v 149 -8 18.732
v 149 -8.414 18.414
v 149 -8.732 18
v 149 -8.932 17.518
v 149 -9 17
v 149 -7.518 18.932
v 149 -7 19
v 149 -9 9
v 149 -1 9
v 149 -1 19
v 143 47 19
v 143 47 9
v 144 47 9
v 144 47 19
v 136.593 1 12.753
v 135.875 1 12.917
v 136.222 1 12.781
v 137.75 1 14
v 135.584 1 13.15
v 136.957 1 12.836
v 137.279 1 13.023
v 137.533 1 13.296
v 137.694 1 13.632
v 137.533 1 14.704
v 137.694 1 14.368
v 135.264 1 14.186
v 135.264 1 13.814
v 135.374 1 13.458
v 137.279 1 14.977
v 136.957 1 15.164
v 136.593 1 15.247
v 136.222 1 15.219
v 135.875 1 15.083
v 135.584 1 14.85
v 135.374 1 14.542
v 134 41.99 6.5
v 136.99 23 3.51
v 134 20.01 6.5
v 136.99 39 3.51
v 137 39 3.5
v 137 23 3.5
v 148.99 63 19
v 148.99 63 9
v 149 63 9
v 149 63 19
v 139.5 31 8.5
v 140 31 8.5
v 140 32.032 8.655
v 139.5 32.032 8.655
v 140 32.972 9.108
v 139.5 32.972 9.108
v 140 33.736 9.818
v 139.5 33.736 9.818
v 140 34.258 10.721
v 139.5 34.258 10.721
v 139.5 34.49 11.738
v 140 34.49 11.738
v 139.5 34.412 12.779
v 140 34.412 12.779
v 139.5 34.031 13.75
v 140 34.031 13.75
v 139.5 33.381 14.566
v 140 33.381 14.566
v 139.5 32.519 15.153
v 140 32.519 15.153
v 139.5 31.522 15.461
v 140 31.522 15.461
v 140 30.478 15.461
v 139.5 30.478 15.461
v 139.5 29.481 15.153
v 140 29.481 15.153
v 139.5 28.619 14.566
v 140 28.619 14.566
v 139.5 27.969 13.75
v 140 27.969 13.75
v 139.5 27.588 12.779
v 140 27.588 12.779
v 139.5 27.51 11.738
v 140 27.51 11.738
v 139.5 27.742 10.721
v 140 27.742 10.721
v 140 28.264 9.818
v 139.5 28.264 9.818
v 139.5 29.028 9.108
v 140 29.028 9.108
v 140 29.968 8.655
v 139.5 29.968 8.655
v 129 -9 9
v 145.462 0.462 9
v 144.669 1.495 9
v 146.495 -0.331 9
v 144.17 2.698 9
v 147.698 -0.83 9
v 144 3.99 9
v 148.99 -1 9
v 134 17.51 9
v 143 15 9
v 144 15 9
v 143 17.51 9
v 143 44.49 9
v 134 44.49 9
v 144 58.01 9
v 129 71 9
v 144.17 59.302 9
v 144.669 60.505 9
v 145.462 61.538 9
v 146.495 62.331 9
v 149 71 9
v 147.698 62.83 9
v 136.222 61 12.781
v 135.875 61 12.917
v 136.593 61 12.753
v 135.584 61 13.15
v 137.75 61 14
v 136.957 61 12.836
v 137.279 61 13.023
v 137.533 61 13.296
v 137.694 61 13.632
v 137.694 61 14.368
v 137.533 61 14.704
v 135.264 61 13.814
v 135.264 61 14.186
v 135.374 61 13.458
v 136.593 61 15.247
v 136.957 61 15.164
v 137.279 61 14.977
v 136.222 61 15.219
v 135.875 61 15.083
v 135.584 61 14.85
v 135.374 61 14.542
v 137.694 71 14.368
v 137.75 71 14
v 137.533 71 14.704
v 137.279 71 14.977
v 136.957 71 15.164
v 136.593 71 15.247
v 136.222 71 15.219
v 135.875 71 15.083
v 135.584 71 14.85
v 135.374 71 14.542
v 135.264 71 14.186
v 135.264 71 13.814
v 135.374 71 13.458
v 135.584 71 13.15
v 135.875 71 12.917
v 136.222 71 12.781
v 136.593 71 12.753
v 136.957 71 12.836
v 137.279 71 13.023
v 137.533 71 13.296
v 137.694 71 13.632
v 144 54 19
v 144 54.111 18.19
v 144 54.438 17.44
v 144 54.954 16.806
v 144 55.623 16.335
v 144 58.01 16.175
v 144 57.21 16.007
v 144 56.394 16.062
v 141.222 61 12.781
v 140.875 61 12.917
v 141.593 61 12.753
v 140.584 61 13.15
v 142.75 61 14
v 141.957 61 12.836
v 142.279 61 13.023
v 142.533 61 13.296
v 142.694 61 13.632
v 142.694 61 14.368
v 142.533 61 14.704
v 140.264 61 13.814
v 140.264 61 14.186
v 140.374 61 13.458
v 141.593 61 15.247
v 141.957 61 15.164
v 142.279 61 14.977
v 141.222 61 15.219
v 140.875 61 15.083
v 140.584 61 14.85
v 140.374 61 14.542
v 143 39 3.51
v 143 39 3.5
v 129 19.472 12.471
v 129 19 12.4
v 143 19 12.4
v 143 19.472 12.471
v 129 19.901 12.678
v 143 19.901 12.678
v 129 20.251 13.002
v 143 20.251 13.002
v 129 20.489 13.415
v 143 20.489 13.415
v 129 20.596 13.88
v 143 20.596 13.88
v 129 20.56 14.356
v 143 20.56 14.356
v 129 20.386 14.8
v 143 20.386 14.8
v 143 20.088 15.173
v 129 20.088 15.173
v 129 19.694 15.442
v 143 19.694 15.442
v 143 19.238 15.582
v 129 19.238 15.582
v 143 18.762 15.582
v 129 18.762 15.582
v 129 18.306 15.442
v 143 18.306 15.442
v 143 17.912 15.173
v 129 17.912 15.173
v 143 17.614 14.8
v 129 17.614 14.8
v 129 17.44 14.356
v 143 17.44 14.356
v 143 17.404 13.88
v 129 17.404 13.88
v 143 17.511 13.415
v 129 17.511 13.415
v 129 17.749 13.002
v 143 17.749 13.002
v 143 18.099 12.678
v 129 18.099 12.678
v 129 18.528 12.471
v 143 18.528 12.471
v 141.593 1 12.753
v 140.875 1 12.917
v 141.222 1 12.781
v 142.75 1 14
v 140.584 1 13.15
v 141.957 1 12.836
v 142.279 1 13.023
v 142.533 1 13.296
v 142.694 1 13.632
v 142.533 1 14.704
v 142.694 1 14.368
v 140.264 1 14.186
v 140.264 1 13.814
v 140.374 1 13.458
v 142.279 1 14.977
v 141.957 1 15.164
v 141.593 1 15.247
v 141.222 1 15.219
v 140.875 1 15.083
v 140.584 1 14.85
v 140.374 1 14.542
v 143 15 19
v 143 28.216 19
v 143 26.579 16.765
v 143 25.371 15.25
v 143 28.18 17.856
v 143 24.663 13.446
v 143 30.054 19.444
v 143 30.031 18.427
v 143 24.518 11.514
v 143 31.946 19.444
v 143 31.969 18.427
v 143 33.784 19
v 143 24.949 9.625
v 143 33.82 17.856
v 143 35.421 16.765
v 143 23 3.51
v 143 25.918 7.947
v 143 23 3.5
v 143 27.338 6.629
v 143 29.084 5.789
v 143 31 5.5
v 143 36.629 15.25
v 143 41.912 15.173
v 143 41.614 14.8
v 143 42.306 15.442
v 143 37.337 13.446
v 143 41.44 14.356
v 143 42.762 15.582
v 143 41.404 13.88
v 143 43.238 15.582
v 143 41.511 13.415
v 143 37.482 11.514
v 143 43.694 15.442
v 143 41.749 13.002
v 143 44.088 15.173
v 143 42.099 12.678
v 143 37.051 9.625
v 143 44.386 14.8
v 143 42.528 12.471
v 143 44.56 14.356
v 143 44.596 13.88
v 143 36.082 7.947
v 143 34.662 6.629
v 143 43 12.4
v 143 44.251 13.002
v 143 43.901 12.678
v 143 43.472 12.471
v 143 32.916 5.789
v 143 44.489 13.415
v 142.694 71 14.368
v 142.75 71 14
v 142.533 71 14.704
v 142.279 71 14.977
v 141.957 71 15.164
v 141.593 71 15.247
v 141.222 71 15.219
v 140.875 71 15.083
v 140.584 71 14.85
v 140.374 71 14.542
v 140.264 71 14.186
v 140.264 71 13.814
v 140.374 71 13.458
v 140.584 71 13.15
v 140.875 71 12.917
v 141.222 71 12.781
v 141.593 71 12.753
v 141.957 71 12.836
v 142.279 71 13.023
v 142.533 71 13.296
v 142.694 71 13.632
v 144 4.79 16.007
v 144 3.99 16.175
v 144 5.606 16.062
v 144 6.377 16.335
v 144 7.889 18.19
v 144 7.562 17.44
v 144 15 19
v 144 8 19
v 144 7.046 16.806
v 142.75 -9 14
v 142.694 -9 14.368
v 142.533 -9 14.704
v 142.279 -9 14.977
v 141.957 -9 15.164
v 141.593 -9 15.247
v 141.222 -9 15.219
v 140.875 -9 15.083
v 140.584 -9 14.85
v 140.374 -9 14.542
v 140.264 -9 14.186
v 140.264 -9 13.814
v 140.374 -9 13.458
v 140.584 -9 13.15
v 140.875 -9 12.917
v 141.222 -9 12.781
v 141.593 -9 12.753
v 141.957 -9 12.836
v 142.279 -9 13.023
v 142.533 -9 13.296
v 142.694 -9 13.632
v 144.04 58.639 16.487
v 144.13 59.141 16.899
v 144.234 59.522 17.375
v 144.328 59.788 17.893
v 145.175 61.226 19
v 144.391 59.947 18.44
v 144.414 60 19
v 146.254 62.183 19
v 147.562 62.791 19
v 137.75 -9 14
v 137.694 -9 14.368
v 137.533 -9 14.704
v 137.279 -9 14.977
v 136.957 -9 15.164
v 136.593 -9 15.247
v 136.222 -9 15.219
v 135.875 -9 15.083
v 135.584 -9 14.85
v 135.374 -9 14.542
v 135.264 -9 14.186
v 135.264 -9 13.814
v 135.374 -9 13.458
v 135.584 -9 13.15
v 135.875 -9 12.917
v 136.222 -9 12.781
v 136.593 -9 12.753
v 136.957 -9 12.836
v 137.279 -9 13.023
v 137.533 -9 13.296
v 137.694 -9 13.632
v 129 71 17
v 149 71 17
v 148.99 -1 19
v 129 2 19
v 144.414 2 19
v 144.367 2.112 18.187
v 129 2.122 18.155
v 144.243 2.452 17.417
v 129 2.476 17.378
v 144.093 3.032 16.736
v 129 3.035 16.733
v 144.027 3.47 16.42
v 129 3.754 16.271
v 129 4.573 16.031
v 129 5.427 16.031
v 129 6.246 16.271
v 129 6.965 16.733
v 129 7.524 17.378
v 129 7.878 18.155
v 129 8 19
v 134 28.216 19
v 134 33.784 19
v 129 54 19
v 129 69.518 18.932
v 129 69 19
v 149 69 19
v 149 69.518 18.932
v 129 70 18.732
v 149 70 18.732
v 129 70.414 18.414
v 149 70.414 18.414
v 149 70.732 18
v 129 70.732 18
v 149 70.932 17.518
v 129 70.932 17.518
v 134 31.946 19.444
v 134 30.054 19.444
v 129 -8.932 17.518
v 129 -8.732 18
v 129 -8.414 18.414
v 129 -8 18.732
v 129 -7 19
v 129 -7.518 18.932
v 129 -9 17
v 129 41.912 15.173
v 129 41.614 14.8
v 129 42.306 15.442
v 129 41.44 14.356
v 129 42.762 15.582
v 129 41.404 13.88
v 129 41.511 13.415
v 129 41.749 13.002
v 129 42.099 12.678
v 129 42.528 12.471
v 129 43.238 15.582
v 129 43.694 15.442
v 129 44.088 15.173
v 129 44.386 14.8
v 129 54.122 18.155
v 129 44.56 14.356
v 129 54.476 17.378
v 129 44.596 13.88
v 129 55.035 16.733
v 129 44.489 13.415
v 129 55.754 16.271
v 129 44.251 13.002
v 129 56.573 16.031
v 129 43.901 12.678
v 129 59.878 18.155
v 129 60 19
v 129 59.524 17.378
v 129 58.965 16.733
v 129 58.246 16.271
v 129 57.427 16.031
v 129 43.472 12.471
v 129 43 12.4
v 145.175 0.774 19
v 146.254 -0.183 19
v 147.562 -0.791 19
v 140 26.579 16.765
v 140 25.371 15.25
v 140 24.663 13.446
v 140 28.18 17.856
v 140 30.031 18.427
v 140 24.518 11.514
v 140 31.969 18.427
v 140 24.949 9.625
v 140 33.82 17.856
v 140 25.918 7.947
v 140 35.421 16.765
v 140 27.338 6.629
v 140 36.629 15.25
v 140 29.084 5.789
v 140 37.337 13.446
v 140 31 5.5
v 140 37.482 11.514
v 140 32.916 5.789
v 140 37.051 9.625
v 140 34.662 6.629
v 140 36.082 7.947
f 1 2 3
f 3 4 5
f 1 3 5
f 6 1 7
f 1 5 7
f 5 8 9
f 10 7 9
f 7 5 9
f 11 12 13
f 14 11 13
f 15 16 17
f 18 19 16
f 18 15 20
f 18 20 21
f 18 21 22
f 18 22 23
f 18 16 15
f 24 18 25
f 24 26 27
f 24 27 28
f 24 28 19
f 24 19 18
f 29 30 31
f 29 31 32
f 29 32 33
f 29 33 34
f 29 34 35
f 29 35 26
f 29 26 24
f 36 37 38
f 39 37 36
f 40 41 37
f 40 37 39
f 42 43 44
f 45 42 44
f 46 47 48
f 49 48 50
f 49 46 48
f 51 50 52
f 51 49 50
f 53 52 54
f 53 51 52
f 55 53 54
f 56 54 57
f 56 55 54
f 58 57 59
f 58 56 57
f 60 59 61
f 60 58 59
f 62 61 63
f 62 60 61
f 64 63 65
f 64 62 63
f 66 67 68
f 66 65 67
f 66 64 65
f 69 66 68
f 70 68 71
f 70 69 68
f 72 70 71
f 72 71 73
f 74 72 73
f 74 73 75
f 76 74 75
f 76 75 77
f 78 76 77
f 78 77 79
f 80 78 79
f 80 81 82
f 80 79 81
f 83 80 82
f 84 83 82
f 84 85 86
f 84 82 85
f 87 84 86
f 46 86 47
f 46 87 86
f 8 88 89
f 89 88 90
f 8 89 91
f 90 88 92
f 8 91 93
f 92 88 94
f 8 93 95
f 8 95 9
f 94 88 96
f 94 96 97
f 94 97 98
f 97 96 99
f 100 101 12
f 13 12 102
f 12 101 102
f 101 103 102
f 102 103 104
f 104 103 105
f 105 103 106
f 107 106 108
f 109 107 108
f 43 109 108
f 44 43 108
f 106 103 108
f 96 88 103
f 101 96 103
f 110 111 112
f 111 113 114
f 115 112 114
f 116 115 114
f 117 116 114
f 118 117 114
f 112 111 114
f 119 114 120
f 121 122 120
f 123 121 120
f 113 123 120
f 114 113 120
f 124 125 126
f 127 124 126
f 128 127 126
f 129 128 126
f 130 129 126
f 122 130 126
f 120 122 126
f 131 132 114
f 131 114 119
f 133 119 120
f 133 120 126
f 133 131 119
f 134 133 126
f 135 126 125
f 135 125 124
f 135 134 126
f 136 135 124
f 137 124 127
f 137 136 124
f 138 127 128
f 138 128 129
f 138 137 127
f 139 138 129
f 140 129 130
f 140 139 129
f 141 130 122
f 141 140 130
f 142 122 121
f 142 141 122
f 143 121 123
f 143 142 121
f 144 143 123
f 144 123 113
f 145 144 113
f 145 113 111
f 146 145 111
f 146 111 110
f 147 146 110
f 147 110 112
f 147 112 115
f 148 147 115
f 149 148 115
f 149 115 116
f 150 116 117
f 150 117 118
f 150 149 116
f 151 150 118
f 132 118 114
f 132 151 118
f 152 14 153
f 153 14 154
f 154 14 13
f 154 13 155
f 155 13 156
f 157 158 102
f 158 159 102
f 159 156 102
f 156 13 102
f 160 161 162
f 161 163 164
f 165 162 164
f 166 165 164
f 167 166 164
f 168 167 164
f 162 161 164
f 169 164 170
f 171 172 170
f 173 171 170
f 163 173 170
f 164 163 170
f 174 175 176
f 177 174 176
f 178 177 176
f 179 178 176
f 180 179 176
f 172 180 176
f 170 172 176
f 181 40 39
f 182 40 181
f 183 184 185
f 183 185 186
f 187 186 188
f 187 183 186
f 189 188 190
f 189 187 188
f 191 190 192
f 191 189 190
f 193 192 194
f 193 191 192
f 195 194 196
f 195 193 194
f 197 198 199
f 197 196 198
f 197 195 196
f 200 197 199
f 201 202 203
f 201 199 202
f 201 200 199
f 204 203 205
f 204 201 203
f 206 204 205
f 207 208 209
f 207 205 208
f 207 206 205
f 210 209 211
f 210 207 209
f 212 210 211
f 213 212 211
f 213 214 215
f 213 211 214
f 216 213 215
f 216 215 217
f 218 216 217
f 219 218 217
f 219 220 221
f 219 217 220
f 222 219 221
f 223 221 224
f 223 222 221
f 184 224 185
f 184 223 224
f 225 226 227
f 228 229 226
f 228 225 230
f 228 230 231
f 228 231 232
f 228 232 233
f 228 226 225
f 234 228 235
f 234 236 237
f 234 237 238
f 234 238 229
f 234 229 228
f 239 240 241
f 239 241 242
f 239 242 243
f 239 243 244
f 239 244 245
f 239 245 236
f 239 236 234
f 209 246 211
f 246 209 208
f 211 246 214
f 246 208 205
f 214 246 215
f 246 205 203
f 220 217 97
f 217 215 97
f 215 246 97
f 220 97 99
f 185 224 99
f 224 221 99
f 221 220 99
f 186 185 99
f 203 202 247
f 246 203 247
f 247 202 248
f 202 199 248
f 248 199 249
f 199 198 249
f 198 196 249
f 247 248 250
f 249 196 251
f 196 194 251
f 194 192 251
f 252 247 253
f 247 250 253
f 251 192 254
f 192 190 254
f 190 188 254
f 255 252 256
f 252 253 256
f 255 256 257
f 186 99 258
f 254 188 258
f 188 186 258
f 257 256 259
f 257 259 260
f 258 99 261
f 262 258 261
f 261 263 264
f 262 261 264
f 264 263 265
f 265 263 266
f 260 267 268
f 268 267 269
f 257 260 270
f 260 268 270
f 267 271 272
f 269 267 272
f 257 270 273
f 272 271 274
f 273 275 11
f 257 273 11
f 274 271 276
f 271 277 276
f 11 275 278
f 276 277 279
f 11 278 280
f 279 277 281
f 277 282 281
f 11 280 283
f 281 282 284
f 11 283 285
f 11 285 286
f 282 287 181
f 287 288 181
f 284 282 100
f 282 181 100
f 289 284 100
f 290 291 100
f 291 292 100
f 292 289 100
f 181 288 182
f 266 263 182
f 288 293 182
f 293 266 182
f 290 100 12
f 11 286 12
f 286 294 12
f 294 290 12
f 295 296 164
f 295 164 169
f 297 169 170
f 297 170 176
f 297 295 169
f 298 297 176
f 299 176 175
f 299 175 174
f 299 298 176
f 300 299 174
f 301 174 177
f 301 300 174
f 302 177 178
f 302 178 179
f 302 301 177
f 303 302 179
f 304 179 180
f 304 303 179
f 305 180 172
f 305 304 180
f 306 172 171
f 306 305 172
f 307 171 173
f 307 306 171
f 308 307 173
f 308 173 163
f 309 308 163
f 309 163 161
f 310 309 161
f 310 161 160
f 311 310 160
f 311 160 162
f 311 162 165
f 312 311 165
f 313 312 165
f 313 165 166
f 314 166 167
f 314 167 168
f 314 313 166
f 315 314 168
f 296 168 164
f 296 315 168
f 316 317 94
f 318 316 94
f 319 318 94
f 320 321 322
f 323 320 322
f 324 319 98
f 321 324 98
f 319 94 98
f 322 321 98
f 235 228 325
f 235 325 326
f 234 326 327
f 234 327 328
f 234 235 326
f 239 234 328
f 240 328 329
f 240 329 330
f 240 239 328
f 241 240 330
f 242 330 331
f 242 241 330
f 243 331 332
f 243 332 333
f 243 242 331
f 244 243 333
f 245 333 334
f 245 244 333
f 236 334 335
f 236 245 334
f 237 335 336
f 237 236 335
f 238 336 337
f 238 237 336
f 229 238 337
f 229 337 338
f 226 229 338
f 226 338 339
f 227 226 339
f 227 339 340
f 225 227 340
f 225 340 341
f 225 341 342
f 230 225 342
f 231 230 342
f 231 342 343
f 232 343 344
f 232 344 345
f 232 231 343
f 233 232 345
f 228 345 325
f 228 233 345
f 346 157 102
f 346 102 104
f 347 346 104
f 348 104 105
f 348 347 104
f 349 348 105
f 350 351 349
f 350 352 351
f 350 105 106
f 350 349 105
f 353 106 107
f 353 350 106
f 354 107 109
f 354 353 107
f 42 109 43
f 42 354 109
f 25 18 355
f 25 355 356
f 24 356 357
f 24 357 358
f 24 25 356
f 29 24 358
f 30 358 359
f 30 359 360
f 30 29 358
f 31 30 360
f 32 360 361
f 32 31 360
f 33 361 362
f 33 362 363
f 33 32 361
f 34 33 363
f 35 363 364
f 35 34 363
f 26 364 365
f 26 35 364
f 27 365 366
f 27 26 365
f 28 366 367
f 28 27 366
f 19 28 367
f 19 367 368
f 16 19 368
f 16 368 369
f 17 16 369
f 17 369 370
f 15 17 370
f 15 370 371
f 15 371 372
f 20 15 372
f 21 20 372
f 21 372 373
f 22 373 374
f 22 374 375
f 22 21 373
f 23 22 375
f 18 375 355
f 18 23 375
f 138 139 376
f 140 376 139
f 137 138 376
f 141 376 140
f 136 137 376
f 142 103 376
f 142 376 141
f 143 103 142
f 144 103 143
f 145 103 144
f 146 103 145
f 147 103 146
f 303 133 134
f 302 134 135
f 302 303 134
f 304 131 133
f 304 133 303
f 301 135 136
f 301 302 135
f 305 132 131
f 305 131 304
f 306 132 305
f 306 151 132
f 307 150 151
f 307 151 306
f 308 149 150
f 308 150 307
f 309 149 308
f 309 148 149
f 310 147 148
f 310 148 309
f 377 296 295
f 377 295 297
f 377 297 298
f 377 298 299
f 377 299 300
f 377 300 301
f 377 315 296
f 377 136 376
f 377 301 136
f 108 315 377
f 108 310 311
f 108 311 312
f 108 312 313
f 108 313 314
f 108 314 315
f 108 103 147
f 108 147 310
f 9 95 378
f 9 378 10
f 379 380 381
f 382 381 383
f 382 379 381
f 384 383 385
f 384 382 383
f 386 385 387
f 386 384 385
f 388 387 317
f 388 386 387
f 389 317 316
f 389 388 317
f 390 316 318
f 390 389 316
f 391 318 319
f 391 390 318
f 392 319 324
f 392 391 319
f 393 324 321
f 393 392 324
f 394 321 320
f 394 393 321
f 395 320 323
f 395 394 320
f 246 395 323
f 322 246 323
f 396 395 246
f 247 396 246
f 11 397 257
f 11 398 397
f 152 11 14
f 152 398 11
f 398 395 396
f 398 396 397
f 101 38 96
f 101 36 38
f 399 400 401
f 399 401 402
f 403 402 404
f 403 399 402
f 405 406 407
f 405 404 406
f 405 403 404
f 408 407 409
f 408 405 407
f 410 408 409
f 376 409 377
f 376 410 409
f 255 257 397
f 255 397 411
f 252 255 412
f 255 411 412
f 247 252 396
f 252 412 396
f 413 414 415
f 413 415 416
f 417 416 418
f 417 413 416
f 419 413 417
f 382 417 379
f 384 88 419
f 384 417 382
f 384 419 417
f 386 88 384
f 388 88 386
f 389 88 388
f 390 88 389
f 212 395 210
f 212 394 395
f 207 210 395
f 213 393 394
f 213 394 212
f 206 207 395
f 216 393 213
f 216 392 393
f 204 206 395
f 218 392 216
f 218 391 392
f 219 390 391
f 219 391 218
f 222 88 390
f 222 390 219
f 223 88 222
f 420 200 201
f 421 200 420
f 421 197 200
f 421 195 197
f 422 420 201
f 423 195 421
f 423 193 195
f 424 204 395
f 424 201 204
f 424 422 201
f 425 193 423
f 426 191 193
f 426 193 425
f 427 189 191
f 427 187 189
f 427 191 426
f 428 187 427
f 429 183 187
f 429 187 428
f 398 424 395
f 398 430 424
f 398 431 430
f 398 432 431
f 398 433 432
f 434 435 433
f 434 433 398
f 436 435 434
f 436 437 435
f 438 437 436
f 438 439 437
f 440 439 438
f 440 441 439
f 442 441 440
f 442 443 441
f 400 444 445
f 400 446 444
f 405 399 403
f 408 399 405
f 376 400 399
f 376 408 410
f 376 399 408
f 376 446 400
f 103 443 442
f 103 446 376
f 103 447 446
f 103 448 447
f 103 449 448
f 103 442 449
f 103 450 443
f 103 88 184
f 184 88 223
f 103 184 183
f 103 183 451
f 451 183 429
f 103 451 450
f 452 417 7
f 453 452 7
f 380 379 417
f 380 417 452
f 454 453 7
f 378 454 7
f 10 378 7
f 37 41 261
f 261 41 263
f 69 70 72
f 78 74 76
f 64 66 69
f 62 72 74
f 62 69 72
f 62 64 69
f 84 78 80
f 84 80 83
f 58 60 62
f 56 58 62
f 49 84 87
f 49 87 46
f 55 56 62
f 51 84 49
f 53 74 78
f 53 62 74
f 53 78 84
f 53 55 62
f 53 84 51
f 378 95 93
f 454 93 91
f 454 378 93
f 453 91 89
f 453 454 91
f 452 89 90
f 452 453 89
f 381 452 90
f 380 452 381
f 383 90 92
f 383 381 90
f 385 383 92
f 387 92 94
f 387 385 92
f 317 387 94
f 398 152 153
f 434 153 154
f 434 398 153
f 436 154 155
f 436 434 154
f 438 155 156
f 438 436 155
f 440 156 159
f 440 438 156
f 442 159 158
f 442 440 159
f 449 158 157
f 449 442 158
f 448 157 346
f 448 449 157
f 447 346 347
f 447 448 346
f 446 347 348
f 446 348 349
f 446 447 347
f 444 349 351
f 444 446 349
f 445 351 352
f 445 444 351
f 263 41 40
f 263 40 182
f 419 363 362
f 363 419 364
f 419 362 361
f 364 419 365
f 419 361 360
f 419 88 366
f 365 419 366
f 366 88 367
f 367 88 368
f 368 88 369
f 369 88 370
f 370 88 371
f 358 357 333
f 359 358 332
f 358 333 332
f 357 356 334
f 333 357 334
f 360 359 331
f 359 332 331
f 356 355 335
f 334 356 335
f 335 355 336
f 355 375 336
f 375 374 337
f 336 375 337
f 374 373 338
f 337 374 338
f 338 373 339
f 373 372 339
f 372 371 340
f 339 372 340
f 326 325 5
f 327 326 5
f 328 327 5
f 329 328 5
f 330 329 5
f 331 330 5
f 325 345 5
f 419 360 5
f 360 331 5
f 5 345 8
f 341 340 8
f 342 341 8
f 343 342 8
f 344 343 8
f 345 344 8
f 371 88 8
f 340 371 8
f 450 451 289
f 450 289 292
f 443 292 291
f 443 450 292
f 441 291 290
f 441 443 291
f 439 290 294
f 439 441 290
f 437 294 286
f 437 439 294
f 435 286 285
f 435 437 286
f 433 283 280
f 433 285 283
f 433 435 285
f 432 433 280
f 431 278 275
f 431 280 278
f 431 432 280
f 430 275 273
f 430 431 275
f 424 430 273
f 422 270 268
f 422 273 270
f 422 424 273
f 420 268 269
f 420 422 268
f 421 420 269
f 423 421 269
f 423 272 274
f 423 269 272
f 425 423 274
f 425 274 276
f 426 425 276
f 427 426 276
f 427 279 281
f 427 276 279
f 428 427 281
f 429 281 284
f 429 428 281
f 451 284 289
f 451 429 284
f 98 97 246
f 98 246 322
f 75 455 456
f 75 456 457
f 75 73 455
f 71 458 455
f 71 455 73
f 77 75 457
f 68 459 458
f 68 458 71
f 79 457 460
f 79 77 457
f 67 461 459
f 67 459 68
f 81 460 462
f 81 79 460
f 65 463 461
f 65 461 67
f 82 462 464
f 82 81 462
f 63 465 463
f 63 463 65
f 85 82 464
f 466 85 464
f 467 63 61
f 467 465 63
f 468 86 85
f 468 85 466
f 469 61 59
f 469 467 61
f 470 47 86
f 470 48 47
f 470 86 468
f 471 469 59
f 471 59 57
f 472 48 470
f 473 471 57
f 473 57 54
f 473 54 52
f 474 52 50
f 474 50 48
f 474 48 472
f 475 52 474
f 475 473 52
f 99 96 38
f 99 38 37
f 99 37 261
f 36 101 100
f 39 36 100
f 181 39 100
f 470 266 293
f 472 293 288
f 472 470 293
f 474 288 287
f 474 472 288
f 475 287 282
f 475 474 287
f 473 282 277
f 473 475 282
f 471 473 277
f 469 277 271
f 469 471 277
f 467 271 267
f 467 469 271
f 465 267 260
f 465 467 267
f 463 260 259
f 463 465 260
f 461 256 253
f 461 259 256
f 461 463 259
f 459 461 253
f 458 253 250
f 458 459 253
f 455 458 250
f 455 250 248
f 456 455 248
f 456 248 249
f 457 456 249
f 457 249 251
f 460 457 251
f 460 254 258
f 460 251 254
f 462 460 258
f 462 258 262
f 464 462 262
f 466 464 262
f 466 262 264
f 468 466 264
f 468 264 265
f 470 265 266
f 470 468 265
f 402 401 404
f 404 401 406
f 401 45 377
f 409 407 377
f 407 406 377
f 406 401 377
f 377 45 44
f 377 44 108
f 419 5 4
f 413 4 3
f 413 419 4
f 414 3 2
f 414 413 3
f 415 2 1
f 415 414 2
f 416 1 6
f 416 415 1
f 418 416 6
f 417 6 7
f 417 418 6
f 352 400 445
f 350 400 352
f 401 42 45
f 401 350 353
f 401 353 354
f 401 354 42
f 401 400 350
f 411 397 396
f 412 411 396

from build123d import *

# Parameters (mm, degrees)
CYLINDER357_R     = 3
CYLINDER357_DEPTH = 17
CYLINDER356_R     = 3
CYLINDER356_DEPTH = 17
BOX221_W          = 5
BOX221_H          = 8
BOX221_DEPTH      = 10
FILLET089_R       = 2
BOX222_W          = 5
BOX222_H          = 60
BOX222_DEPTH      = 10
BOX217_W          = 1
BOX217_H          = 32
BOX217_DEPTH      = 22
CYLINDER297_R     = 1.6
CYLINDER297_DEPTH = 16
CYLINDER296_R     = 1.6
CYLINDER296_DEPTH = 16
CYLINDER295_R     = 1.25
CYLINDER295_DEPTH = 10
CYLINDER293_R     = 1.25
CYLINDER293_DEPTH = 10
CYLINDER294_R     = 1.25
CYLINDER294_DEPTH = 10
CYLINDER292_R     = 1.25
CYLINDER292_DEPTH = 10
CYLINDER291_R     = 3.5
CYLINDER291_DEPTH = 4
CYLINDER289_R     = 6.5
CYLINDER289_DEPTH = 4
BOX218_W          = 15
BOX218_H          = 16
BOX218_DEPTH      = 5.5
CYLINDER290_R     = 8
CYLINDER290_DEPTH = 10
BOX216_W          = 10
BOX216_H          = 80
BOX216_DEPTH      = 10
BOX219_W          = 5
BOX219_H          = 80
BOX219_DEPTH      = 10
FILLET090_R       = 2
BOX220_W          = 5
BOX220_H          = 8
BOX220_DEPTH      = 10
FILLET088_R       = 2
CHAMFER031_SIZE   = 5.49
CHAMFER032_SIZE   = 3
FILLET110_R       = 4.99


with BuildPart() as cylinder357:
    # Cylinder357 → Cylinder357 (new body)
    with BuildSketch(Plane(origin=(129, 57, 19), x_dir=(0, 0, -1), z_dir=(1, 0, 0))):
        Circle(CYLINDER357_R)
    extrude(amount=CYLINDER357_DEPTH)


with BuildPart() as fusion302:
    # Cylinder356 → Cylinder356 (new body)
    with BuildSketch(Plane(origin=(129, 5, 19), x_dir=(0, 0, -1), z_dir=(1, 0, 0))):
        Circle(CYLINDER356_R)
    extrude(amount=CYLINDER356_DEPTH)

    # Fusion302: union Cylinder357
    add(cylinder357.part)


with BuildPart() as fillet089:
    # Box221 → Box221 (new body)
    with BuildSketch(Plane(origin=(90, 53, 9), x_dir=(1, 0, 0), z_dir=(0, 0, 1))):
        with Locations((2.5, 4)):
            Rectangle(BOX221_W, BOX221_H)
    extrude(amount=BOX221_DEPTH)

    # Fillet089
    fillet089_edges = [fillet089.edges().sort_by_distance(p)[0] for p in [
        (92.5, 61, 19),
    ]]
    fillet(fillet089_edges, radius=FILLET089_R)


with BuildPart() as fillet089_1:
    # Fillet089 placement: moved
    add(fillet089.part.moved(Location((0, 10, 0))))


with BuildPart() as cube302:
    # Box222 → Box222 (new body)
    with BuildSketch(Plane(origin=(75, 1, -1), x_dir=(1, 0, 0), z_dir=(0, 0, 1))):
        with Locations((2.5, 30)):
            Rectangle(BOX222_W, BOX222_H)
    extrude(amount=BOX222_DEPTH)


with BuildPart() as cube297:
    # Box217 → Box217 (new body)
    with BuildSketch(Plane(origin=(89, 15, 2), x_dir=(1, 0, 0), z_dir=(0, 0, 1))):
        with Locations((0.5, 16)):
            Rectangle(BOX217_W, BOX217_H)
    extrude(amount=BOX217_DEPTH)


with BuildPart() as cylinder297:
    # Cylinder297 → Cylinder297 (new body)
    with BuildSketch(Plane(origin=(80, 43, 14), x_dir=(0, 0, -1), z_dir=(1, 0, 0))):
        Circle(CYLINDER297_R)
    extrude(amount=CYLINDER297_DEPTH)


with BuildPart() as fusion262:
    # Cylinder296 → Cylinder296 (new body)
    with BuildSketch(Plane(origin=(80, 19, 14), x_dir=(0, 0, -1), z_dir=(1, 0, 0))):
        Circle(CYLINDER296_R)
    extrude(amount=CYLINDER296_DEPTH)

    # Fusion262: union Cylinder297
    add(cylinder297.part)


with BuildPart() as fusion262_1:
    # Fusion262 placement: moved
    add(fusion262.part.moved(Location((-6, 0, 0))))


with BuildPart() as cylinder295:
    # Cylinder295 → Cylinder295 (new body)
    with BuildSketch(Plane(origin=(87.5, 71, 14), x_dir=(1, 0, 0), z_dir=(0, -1, 0))):
        Circle(CYLINDER295_R)
    extrude(amount=CYLINDER295_DEPTH)


with BuildPart() as fusion260:
    # Cylinder293 → Cylinder293 (new body)
    with BuildSketch(Plane(origin=(87.5, 1, 14), x_dir=(1, 0, 0), z_dir=(0, -1, 0))):
        Circle(CYLINDER293_R)
    extrude(amount=CYLINDER293_DEPTH)

    # Fusion260: union Cylinder295
    add(cylinder295.part)


with BuildPart() as cylinder294:
    # Cylinder294 → Cylinder294 (new body)
    with BuildSketch(Plane(origin=(82.5, 71, 14), x_dir=(1, 0, 0), z_dir=(0, -1, 0))):
        Circle(CYLINDER294_R)
    extrude(amount=CYLINDER294_DEPTH)


with BuildPart() as fusion261:
    # Cylinder292 → Cylinder292 (new body)
    with BuildSketch(Plane(origin=(82.5, 1, 14), x_dir=(1, 0, 0), z_dir=(0, -1, 0))):
        Circle(CYLINDER292_R)
    extrude(amount=CYLINDER292_DEPTH)

    # Fusion259: union Cylinder294
    add(cylinder294.part)

    # Fusion261: union Fusion260
    add(fusion260.part)


with BuildPart() as cylinder291:
    # Cylinder291 → Cylinder291 (new body)
    with BuildSketch(Plane(origin=(89.5, 31, 10), x_dir=(0, 0, -1), z_dir=(1, 0, 0))):
        Circle(CYLINDER291_R)
    extrude(amount=CYLINDER291_DEPTH)


with BuildPart() as fusion257:
    # Cylinder289 → Cylinder289 (new body)
    with BuildSketch(Plane(origin=(90, 31, 10), x_dir=(0, 0, -1), z_dir=(1, 0, 0))):
        Circle(CYLINDER289_R)
    extrude(amount=CYLINDER289_DEPTH)

    # Fusion257: union Cylinder291
    add(cylinder291.part)


with BuildPart() as fusion257_1:
    # Fusion257 placement: moved
    add(fusion257.part.moved(Location((-4, 0, 2))))


with BuildPart() as cube298:
    # Box218 → Box218 (new body)
    with BuildSketch(Plane(origin=(75, 23, 3.5), x_dir=(1, 0, 0), z_dir=(0, 0, 1))):
        with Locations((7.5, 8)):
            Rectangle(BOX218_W, BOX218_H)
    extrude(amount=BOX218_DEPTH)


with BuildPart() as cylinder290:
    # Cylinder290 → Cylinder290 (new body)
    with BuildSketch(Plane(origin=(80, 31, 11.5), x_dir=(0, 0, -1), z_dir=(1, 0, 0))):
        Circle(CYLINDER290_R)
    extrude(amount=CYLINDER290_DEPTH)


with BuildPart() as fusion258:
    # Box216 → Box216 (new body)
    with BuildSketch(Plane(origin=(80, -9, 9), x_dir=(1, 0, 0), z_dir=(0, 0, 1))):
        with Locations((5, 40)):
            Rectangle(BOX216_W, BOX216_H)
    extrude(amount=BOX216_DEPTH)

    # Fusion258: union Cylinder290
    add(cylinder290.part)


with BuildPart() as fillet090:
    # Box219 → Box219 (new body)
    with BuildSketch(Plane(origin=(75, -9, 9), x_dir=(1, 0, 0), z_dir=(0, 0, 1))):
        with Locations((2.5, 40)):
            Rectangle(BOX219_W, BOX219_H)
    extrude(amount=BOX219_DEPTH)

    # Fusion263: union Cube298, Fusion258
    add(cube298.part)
    add(fusion258.part)

    # Cut226: cut Fusion257
    add(fusion257_1.part, mode=Mode.SUBTRACT)

    # Cut227: cut Fusion261
    add(fusion261.part, mode=Mode.SUBTRACT)

    # Cut228: cut Fusion262
    add(fusion262_1.part, mode=Mode.SUBTRACT)

    # Cut229: cut Cube297
    add(cube297.part, mode=Mode.SUBTRACT)

    # Cut230: cut Cube302
    add(cube302.part, mode=Mode.SUBTRACT)

    # Fillet090
    fillet090_edges = [fillet090.edges().sort_by_distance(p)[0] for p in [
        (82.5, -9, 19),
        (82.5, 71, 19),
    ]]
    fillet(fillet090_edges, radius=FILLET090_R)


with BuildPart() as front_threaded_bar_support_wide:
    # Box220 → Box220 (new body)
    with BuildSketch(Plane(origin=(90, 1, 9), x_dir=(1, 0, 0), z_dir=(0, 0, 1))):
        with Locations((2.5, 4)):
            Rectangle(BOX220_W, BOX220_H)
    extrude(amount=BOX220_DEPTH)

    # Fillet088
    fillet088_edges = [front_threaded_bar_support_wide.edges().sort_by_distance(p)[0] for p in [
        (92.5, 1, 19),
    ]]
    fillet(fillet088_edges, radius=FILLET088_R)


with BuildPart() as front_threaded_bar_support_wide_1:
    # Fillet088 placement: moved
    add(front_threaded_bar_support_wide.part.moved(Location((0, -10, 0))))

    # Fusion264: union Fillet089, Fillet090
    add(fillet089_1.part)
    add(fillet090.part)


with BuildPart() as front_threaded_bar_support_wide_2:
    # Fusion264 placement: moved
    add(front_threaded_bar_support_wide_1.part.moved(Location((54, 0, 0))))

    # Cut305: cut Fusion302
    add(fusion302.part, mode=Mode.SUBTRACT)

    # Chamfer031
    chamfer031_edges = [front_threaded_bar_support_wide_2.edges().sort_by_distance(p)[0] for p in [
        (138.5, 39, 9),
        (138.5, 23, 9),
    ]]
    chamfer(chamfer031_edges, length=CHAMFER031_SIZE)

    # Chamfer032
    chamfer032_edges = [front_threaded_bar_support_wide_2.edges().sort_by_distance(p)[0] for p in [
        (134, 31, 3.5),
    ]]
    chamfer(chamfer032_edges, length=CHAMFER032_SIZE)

    # Fillet110
    fillet110_edges = [front_threaded_bar_support_wide_2.edges().sort_by_distance(p)[0] for p in [
        (144, 63, 14),
        (144, -1, 14),
    ]]
    fillet(fillet110_edges, radius=FILLET110_R)


solid = front_threaded_bar_support_wide_2.part
